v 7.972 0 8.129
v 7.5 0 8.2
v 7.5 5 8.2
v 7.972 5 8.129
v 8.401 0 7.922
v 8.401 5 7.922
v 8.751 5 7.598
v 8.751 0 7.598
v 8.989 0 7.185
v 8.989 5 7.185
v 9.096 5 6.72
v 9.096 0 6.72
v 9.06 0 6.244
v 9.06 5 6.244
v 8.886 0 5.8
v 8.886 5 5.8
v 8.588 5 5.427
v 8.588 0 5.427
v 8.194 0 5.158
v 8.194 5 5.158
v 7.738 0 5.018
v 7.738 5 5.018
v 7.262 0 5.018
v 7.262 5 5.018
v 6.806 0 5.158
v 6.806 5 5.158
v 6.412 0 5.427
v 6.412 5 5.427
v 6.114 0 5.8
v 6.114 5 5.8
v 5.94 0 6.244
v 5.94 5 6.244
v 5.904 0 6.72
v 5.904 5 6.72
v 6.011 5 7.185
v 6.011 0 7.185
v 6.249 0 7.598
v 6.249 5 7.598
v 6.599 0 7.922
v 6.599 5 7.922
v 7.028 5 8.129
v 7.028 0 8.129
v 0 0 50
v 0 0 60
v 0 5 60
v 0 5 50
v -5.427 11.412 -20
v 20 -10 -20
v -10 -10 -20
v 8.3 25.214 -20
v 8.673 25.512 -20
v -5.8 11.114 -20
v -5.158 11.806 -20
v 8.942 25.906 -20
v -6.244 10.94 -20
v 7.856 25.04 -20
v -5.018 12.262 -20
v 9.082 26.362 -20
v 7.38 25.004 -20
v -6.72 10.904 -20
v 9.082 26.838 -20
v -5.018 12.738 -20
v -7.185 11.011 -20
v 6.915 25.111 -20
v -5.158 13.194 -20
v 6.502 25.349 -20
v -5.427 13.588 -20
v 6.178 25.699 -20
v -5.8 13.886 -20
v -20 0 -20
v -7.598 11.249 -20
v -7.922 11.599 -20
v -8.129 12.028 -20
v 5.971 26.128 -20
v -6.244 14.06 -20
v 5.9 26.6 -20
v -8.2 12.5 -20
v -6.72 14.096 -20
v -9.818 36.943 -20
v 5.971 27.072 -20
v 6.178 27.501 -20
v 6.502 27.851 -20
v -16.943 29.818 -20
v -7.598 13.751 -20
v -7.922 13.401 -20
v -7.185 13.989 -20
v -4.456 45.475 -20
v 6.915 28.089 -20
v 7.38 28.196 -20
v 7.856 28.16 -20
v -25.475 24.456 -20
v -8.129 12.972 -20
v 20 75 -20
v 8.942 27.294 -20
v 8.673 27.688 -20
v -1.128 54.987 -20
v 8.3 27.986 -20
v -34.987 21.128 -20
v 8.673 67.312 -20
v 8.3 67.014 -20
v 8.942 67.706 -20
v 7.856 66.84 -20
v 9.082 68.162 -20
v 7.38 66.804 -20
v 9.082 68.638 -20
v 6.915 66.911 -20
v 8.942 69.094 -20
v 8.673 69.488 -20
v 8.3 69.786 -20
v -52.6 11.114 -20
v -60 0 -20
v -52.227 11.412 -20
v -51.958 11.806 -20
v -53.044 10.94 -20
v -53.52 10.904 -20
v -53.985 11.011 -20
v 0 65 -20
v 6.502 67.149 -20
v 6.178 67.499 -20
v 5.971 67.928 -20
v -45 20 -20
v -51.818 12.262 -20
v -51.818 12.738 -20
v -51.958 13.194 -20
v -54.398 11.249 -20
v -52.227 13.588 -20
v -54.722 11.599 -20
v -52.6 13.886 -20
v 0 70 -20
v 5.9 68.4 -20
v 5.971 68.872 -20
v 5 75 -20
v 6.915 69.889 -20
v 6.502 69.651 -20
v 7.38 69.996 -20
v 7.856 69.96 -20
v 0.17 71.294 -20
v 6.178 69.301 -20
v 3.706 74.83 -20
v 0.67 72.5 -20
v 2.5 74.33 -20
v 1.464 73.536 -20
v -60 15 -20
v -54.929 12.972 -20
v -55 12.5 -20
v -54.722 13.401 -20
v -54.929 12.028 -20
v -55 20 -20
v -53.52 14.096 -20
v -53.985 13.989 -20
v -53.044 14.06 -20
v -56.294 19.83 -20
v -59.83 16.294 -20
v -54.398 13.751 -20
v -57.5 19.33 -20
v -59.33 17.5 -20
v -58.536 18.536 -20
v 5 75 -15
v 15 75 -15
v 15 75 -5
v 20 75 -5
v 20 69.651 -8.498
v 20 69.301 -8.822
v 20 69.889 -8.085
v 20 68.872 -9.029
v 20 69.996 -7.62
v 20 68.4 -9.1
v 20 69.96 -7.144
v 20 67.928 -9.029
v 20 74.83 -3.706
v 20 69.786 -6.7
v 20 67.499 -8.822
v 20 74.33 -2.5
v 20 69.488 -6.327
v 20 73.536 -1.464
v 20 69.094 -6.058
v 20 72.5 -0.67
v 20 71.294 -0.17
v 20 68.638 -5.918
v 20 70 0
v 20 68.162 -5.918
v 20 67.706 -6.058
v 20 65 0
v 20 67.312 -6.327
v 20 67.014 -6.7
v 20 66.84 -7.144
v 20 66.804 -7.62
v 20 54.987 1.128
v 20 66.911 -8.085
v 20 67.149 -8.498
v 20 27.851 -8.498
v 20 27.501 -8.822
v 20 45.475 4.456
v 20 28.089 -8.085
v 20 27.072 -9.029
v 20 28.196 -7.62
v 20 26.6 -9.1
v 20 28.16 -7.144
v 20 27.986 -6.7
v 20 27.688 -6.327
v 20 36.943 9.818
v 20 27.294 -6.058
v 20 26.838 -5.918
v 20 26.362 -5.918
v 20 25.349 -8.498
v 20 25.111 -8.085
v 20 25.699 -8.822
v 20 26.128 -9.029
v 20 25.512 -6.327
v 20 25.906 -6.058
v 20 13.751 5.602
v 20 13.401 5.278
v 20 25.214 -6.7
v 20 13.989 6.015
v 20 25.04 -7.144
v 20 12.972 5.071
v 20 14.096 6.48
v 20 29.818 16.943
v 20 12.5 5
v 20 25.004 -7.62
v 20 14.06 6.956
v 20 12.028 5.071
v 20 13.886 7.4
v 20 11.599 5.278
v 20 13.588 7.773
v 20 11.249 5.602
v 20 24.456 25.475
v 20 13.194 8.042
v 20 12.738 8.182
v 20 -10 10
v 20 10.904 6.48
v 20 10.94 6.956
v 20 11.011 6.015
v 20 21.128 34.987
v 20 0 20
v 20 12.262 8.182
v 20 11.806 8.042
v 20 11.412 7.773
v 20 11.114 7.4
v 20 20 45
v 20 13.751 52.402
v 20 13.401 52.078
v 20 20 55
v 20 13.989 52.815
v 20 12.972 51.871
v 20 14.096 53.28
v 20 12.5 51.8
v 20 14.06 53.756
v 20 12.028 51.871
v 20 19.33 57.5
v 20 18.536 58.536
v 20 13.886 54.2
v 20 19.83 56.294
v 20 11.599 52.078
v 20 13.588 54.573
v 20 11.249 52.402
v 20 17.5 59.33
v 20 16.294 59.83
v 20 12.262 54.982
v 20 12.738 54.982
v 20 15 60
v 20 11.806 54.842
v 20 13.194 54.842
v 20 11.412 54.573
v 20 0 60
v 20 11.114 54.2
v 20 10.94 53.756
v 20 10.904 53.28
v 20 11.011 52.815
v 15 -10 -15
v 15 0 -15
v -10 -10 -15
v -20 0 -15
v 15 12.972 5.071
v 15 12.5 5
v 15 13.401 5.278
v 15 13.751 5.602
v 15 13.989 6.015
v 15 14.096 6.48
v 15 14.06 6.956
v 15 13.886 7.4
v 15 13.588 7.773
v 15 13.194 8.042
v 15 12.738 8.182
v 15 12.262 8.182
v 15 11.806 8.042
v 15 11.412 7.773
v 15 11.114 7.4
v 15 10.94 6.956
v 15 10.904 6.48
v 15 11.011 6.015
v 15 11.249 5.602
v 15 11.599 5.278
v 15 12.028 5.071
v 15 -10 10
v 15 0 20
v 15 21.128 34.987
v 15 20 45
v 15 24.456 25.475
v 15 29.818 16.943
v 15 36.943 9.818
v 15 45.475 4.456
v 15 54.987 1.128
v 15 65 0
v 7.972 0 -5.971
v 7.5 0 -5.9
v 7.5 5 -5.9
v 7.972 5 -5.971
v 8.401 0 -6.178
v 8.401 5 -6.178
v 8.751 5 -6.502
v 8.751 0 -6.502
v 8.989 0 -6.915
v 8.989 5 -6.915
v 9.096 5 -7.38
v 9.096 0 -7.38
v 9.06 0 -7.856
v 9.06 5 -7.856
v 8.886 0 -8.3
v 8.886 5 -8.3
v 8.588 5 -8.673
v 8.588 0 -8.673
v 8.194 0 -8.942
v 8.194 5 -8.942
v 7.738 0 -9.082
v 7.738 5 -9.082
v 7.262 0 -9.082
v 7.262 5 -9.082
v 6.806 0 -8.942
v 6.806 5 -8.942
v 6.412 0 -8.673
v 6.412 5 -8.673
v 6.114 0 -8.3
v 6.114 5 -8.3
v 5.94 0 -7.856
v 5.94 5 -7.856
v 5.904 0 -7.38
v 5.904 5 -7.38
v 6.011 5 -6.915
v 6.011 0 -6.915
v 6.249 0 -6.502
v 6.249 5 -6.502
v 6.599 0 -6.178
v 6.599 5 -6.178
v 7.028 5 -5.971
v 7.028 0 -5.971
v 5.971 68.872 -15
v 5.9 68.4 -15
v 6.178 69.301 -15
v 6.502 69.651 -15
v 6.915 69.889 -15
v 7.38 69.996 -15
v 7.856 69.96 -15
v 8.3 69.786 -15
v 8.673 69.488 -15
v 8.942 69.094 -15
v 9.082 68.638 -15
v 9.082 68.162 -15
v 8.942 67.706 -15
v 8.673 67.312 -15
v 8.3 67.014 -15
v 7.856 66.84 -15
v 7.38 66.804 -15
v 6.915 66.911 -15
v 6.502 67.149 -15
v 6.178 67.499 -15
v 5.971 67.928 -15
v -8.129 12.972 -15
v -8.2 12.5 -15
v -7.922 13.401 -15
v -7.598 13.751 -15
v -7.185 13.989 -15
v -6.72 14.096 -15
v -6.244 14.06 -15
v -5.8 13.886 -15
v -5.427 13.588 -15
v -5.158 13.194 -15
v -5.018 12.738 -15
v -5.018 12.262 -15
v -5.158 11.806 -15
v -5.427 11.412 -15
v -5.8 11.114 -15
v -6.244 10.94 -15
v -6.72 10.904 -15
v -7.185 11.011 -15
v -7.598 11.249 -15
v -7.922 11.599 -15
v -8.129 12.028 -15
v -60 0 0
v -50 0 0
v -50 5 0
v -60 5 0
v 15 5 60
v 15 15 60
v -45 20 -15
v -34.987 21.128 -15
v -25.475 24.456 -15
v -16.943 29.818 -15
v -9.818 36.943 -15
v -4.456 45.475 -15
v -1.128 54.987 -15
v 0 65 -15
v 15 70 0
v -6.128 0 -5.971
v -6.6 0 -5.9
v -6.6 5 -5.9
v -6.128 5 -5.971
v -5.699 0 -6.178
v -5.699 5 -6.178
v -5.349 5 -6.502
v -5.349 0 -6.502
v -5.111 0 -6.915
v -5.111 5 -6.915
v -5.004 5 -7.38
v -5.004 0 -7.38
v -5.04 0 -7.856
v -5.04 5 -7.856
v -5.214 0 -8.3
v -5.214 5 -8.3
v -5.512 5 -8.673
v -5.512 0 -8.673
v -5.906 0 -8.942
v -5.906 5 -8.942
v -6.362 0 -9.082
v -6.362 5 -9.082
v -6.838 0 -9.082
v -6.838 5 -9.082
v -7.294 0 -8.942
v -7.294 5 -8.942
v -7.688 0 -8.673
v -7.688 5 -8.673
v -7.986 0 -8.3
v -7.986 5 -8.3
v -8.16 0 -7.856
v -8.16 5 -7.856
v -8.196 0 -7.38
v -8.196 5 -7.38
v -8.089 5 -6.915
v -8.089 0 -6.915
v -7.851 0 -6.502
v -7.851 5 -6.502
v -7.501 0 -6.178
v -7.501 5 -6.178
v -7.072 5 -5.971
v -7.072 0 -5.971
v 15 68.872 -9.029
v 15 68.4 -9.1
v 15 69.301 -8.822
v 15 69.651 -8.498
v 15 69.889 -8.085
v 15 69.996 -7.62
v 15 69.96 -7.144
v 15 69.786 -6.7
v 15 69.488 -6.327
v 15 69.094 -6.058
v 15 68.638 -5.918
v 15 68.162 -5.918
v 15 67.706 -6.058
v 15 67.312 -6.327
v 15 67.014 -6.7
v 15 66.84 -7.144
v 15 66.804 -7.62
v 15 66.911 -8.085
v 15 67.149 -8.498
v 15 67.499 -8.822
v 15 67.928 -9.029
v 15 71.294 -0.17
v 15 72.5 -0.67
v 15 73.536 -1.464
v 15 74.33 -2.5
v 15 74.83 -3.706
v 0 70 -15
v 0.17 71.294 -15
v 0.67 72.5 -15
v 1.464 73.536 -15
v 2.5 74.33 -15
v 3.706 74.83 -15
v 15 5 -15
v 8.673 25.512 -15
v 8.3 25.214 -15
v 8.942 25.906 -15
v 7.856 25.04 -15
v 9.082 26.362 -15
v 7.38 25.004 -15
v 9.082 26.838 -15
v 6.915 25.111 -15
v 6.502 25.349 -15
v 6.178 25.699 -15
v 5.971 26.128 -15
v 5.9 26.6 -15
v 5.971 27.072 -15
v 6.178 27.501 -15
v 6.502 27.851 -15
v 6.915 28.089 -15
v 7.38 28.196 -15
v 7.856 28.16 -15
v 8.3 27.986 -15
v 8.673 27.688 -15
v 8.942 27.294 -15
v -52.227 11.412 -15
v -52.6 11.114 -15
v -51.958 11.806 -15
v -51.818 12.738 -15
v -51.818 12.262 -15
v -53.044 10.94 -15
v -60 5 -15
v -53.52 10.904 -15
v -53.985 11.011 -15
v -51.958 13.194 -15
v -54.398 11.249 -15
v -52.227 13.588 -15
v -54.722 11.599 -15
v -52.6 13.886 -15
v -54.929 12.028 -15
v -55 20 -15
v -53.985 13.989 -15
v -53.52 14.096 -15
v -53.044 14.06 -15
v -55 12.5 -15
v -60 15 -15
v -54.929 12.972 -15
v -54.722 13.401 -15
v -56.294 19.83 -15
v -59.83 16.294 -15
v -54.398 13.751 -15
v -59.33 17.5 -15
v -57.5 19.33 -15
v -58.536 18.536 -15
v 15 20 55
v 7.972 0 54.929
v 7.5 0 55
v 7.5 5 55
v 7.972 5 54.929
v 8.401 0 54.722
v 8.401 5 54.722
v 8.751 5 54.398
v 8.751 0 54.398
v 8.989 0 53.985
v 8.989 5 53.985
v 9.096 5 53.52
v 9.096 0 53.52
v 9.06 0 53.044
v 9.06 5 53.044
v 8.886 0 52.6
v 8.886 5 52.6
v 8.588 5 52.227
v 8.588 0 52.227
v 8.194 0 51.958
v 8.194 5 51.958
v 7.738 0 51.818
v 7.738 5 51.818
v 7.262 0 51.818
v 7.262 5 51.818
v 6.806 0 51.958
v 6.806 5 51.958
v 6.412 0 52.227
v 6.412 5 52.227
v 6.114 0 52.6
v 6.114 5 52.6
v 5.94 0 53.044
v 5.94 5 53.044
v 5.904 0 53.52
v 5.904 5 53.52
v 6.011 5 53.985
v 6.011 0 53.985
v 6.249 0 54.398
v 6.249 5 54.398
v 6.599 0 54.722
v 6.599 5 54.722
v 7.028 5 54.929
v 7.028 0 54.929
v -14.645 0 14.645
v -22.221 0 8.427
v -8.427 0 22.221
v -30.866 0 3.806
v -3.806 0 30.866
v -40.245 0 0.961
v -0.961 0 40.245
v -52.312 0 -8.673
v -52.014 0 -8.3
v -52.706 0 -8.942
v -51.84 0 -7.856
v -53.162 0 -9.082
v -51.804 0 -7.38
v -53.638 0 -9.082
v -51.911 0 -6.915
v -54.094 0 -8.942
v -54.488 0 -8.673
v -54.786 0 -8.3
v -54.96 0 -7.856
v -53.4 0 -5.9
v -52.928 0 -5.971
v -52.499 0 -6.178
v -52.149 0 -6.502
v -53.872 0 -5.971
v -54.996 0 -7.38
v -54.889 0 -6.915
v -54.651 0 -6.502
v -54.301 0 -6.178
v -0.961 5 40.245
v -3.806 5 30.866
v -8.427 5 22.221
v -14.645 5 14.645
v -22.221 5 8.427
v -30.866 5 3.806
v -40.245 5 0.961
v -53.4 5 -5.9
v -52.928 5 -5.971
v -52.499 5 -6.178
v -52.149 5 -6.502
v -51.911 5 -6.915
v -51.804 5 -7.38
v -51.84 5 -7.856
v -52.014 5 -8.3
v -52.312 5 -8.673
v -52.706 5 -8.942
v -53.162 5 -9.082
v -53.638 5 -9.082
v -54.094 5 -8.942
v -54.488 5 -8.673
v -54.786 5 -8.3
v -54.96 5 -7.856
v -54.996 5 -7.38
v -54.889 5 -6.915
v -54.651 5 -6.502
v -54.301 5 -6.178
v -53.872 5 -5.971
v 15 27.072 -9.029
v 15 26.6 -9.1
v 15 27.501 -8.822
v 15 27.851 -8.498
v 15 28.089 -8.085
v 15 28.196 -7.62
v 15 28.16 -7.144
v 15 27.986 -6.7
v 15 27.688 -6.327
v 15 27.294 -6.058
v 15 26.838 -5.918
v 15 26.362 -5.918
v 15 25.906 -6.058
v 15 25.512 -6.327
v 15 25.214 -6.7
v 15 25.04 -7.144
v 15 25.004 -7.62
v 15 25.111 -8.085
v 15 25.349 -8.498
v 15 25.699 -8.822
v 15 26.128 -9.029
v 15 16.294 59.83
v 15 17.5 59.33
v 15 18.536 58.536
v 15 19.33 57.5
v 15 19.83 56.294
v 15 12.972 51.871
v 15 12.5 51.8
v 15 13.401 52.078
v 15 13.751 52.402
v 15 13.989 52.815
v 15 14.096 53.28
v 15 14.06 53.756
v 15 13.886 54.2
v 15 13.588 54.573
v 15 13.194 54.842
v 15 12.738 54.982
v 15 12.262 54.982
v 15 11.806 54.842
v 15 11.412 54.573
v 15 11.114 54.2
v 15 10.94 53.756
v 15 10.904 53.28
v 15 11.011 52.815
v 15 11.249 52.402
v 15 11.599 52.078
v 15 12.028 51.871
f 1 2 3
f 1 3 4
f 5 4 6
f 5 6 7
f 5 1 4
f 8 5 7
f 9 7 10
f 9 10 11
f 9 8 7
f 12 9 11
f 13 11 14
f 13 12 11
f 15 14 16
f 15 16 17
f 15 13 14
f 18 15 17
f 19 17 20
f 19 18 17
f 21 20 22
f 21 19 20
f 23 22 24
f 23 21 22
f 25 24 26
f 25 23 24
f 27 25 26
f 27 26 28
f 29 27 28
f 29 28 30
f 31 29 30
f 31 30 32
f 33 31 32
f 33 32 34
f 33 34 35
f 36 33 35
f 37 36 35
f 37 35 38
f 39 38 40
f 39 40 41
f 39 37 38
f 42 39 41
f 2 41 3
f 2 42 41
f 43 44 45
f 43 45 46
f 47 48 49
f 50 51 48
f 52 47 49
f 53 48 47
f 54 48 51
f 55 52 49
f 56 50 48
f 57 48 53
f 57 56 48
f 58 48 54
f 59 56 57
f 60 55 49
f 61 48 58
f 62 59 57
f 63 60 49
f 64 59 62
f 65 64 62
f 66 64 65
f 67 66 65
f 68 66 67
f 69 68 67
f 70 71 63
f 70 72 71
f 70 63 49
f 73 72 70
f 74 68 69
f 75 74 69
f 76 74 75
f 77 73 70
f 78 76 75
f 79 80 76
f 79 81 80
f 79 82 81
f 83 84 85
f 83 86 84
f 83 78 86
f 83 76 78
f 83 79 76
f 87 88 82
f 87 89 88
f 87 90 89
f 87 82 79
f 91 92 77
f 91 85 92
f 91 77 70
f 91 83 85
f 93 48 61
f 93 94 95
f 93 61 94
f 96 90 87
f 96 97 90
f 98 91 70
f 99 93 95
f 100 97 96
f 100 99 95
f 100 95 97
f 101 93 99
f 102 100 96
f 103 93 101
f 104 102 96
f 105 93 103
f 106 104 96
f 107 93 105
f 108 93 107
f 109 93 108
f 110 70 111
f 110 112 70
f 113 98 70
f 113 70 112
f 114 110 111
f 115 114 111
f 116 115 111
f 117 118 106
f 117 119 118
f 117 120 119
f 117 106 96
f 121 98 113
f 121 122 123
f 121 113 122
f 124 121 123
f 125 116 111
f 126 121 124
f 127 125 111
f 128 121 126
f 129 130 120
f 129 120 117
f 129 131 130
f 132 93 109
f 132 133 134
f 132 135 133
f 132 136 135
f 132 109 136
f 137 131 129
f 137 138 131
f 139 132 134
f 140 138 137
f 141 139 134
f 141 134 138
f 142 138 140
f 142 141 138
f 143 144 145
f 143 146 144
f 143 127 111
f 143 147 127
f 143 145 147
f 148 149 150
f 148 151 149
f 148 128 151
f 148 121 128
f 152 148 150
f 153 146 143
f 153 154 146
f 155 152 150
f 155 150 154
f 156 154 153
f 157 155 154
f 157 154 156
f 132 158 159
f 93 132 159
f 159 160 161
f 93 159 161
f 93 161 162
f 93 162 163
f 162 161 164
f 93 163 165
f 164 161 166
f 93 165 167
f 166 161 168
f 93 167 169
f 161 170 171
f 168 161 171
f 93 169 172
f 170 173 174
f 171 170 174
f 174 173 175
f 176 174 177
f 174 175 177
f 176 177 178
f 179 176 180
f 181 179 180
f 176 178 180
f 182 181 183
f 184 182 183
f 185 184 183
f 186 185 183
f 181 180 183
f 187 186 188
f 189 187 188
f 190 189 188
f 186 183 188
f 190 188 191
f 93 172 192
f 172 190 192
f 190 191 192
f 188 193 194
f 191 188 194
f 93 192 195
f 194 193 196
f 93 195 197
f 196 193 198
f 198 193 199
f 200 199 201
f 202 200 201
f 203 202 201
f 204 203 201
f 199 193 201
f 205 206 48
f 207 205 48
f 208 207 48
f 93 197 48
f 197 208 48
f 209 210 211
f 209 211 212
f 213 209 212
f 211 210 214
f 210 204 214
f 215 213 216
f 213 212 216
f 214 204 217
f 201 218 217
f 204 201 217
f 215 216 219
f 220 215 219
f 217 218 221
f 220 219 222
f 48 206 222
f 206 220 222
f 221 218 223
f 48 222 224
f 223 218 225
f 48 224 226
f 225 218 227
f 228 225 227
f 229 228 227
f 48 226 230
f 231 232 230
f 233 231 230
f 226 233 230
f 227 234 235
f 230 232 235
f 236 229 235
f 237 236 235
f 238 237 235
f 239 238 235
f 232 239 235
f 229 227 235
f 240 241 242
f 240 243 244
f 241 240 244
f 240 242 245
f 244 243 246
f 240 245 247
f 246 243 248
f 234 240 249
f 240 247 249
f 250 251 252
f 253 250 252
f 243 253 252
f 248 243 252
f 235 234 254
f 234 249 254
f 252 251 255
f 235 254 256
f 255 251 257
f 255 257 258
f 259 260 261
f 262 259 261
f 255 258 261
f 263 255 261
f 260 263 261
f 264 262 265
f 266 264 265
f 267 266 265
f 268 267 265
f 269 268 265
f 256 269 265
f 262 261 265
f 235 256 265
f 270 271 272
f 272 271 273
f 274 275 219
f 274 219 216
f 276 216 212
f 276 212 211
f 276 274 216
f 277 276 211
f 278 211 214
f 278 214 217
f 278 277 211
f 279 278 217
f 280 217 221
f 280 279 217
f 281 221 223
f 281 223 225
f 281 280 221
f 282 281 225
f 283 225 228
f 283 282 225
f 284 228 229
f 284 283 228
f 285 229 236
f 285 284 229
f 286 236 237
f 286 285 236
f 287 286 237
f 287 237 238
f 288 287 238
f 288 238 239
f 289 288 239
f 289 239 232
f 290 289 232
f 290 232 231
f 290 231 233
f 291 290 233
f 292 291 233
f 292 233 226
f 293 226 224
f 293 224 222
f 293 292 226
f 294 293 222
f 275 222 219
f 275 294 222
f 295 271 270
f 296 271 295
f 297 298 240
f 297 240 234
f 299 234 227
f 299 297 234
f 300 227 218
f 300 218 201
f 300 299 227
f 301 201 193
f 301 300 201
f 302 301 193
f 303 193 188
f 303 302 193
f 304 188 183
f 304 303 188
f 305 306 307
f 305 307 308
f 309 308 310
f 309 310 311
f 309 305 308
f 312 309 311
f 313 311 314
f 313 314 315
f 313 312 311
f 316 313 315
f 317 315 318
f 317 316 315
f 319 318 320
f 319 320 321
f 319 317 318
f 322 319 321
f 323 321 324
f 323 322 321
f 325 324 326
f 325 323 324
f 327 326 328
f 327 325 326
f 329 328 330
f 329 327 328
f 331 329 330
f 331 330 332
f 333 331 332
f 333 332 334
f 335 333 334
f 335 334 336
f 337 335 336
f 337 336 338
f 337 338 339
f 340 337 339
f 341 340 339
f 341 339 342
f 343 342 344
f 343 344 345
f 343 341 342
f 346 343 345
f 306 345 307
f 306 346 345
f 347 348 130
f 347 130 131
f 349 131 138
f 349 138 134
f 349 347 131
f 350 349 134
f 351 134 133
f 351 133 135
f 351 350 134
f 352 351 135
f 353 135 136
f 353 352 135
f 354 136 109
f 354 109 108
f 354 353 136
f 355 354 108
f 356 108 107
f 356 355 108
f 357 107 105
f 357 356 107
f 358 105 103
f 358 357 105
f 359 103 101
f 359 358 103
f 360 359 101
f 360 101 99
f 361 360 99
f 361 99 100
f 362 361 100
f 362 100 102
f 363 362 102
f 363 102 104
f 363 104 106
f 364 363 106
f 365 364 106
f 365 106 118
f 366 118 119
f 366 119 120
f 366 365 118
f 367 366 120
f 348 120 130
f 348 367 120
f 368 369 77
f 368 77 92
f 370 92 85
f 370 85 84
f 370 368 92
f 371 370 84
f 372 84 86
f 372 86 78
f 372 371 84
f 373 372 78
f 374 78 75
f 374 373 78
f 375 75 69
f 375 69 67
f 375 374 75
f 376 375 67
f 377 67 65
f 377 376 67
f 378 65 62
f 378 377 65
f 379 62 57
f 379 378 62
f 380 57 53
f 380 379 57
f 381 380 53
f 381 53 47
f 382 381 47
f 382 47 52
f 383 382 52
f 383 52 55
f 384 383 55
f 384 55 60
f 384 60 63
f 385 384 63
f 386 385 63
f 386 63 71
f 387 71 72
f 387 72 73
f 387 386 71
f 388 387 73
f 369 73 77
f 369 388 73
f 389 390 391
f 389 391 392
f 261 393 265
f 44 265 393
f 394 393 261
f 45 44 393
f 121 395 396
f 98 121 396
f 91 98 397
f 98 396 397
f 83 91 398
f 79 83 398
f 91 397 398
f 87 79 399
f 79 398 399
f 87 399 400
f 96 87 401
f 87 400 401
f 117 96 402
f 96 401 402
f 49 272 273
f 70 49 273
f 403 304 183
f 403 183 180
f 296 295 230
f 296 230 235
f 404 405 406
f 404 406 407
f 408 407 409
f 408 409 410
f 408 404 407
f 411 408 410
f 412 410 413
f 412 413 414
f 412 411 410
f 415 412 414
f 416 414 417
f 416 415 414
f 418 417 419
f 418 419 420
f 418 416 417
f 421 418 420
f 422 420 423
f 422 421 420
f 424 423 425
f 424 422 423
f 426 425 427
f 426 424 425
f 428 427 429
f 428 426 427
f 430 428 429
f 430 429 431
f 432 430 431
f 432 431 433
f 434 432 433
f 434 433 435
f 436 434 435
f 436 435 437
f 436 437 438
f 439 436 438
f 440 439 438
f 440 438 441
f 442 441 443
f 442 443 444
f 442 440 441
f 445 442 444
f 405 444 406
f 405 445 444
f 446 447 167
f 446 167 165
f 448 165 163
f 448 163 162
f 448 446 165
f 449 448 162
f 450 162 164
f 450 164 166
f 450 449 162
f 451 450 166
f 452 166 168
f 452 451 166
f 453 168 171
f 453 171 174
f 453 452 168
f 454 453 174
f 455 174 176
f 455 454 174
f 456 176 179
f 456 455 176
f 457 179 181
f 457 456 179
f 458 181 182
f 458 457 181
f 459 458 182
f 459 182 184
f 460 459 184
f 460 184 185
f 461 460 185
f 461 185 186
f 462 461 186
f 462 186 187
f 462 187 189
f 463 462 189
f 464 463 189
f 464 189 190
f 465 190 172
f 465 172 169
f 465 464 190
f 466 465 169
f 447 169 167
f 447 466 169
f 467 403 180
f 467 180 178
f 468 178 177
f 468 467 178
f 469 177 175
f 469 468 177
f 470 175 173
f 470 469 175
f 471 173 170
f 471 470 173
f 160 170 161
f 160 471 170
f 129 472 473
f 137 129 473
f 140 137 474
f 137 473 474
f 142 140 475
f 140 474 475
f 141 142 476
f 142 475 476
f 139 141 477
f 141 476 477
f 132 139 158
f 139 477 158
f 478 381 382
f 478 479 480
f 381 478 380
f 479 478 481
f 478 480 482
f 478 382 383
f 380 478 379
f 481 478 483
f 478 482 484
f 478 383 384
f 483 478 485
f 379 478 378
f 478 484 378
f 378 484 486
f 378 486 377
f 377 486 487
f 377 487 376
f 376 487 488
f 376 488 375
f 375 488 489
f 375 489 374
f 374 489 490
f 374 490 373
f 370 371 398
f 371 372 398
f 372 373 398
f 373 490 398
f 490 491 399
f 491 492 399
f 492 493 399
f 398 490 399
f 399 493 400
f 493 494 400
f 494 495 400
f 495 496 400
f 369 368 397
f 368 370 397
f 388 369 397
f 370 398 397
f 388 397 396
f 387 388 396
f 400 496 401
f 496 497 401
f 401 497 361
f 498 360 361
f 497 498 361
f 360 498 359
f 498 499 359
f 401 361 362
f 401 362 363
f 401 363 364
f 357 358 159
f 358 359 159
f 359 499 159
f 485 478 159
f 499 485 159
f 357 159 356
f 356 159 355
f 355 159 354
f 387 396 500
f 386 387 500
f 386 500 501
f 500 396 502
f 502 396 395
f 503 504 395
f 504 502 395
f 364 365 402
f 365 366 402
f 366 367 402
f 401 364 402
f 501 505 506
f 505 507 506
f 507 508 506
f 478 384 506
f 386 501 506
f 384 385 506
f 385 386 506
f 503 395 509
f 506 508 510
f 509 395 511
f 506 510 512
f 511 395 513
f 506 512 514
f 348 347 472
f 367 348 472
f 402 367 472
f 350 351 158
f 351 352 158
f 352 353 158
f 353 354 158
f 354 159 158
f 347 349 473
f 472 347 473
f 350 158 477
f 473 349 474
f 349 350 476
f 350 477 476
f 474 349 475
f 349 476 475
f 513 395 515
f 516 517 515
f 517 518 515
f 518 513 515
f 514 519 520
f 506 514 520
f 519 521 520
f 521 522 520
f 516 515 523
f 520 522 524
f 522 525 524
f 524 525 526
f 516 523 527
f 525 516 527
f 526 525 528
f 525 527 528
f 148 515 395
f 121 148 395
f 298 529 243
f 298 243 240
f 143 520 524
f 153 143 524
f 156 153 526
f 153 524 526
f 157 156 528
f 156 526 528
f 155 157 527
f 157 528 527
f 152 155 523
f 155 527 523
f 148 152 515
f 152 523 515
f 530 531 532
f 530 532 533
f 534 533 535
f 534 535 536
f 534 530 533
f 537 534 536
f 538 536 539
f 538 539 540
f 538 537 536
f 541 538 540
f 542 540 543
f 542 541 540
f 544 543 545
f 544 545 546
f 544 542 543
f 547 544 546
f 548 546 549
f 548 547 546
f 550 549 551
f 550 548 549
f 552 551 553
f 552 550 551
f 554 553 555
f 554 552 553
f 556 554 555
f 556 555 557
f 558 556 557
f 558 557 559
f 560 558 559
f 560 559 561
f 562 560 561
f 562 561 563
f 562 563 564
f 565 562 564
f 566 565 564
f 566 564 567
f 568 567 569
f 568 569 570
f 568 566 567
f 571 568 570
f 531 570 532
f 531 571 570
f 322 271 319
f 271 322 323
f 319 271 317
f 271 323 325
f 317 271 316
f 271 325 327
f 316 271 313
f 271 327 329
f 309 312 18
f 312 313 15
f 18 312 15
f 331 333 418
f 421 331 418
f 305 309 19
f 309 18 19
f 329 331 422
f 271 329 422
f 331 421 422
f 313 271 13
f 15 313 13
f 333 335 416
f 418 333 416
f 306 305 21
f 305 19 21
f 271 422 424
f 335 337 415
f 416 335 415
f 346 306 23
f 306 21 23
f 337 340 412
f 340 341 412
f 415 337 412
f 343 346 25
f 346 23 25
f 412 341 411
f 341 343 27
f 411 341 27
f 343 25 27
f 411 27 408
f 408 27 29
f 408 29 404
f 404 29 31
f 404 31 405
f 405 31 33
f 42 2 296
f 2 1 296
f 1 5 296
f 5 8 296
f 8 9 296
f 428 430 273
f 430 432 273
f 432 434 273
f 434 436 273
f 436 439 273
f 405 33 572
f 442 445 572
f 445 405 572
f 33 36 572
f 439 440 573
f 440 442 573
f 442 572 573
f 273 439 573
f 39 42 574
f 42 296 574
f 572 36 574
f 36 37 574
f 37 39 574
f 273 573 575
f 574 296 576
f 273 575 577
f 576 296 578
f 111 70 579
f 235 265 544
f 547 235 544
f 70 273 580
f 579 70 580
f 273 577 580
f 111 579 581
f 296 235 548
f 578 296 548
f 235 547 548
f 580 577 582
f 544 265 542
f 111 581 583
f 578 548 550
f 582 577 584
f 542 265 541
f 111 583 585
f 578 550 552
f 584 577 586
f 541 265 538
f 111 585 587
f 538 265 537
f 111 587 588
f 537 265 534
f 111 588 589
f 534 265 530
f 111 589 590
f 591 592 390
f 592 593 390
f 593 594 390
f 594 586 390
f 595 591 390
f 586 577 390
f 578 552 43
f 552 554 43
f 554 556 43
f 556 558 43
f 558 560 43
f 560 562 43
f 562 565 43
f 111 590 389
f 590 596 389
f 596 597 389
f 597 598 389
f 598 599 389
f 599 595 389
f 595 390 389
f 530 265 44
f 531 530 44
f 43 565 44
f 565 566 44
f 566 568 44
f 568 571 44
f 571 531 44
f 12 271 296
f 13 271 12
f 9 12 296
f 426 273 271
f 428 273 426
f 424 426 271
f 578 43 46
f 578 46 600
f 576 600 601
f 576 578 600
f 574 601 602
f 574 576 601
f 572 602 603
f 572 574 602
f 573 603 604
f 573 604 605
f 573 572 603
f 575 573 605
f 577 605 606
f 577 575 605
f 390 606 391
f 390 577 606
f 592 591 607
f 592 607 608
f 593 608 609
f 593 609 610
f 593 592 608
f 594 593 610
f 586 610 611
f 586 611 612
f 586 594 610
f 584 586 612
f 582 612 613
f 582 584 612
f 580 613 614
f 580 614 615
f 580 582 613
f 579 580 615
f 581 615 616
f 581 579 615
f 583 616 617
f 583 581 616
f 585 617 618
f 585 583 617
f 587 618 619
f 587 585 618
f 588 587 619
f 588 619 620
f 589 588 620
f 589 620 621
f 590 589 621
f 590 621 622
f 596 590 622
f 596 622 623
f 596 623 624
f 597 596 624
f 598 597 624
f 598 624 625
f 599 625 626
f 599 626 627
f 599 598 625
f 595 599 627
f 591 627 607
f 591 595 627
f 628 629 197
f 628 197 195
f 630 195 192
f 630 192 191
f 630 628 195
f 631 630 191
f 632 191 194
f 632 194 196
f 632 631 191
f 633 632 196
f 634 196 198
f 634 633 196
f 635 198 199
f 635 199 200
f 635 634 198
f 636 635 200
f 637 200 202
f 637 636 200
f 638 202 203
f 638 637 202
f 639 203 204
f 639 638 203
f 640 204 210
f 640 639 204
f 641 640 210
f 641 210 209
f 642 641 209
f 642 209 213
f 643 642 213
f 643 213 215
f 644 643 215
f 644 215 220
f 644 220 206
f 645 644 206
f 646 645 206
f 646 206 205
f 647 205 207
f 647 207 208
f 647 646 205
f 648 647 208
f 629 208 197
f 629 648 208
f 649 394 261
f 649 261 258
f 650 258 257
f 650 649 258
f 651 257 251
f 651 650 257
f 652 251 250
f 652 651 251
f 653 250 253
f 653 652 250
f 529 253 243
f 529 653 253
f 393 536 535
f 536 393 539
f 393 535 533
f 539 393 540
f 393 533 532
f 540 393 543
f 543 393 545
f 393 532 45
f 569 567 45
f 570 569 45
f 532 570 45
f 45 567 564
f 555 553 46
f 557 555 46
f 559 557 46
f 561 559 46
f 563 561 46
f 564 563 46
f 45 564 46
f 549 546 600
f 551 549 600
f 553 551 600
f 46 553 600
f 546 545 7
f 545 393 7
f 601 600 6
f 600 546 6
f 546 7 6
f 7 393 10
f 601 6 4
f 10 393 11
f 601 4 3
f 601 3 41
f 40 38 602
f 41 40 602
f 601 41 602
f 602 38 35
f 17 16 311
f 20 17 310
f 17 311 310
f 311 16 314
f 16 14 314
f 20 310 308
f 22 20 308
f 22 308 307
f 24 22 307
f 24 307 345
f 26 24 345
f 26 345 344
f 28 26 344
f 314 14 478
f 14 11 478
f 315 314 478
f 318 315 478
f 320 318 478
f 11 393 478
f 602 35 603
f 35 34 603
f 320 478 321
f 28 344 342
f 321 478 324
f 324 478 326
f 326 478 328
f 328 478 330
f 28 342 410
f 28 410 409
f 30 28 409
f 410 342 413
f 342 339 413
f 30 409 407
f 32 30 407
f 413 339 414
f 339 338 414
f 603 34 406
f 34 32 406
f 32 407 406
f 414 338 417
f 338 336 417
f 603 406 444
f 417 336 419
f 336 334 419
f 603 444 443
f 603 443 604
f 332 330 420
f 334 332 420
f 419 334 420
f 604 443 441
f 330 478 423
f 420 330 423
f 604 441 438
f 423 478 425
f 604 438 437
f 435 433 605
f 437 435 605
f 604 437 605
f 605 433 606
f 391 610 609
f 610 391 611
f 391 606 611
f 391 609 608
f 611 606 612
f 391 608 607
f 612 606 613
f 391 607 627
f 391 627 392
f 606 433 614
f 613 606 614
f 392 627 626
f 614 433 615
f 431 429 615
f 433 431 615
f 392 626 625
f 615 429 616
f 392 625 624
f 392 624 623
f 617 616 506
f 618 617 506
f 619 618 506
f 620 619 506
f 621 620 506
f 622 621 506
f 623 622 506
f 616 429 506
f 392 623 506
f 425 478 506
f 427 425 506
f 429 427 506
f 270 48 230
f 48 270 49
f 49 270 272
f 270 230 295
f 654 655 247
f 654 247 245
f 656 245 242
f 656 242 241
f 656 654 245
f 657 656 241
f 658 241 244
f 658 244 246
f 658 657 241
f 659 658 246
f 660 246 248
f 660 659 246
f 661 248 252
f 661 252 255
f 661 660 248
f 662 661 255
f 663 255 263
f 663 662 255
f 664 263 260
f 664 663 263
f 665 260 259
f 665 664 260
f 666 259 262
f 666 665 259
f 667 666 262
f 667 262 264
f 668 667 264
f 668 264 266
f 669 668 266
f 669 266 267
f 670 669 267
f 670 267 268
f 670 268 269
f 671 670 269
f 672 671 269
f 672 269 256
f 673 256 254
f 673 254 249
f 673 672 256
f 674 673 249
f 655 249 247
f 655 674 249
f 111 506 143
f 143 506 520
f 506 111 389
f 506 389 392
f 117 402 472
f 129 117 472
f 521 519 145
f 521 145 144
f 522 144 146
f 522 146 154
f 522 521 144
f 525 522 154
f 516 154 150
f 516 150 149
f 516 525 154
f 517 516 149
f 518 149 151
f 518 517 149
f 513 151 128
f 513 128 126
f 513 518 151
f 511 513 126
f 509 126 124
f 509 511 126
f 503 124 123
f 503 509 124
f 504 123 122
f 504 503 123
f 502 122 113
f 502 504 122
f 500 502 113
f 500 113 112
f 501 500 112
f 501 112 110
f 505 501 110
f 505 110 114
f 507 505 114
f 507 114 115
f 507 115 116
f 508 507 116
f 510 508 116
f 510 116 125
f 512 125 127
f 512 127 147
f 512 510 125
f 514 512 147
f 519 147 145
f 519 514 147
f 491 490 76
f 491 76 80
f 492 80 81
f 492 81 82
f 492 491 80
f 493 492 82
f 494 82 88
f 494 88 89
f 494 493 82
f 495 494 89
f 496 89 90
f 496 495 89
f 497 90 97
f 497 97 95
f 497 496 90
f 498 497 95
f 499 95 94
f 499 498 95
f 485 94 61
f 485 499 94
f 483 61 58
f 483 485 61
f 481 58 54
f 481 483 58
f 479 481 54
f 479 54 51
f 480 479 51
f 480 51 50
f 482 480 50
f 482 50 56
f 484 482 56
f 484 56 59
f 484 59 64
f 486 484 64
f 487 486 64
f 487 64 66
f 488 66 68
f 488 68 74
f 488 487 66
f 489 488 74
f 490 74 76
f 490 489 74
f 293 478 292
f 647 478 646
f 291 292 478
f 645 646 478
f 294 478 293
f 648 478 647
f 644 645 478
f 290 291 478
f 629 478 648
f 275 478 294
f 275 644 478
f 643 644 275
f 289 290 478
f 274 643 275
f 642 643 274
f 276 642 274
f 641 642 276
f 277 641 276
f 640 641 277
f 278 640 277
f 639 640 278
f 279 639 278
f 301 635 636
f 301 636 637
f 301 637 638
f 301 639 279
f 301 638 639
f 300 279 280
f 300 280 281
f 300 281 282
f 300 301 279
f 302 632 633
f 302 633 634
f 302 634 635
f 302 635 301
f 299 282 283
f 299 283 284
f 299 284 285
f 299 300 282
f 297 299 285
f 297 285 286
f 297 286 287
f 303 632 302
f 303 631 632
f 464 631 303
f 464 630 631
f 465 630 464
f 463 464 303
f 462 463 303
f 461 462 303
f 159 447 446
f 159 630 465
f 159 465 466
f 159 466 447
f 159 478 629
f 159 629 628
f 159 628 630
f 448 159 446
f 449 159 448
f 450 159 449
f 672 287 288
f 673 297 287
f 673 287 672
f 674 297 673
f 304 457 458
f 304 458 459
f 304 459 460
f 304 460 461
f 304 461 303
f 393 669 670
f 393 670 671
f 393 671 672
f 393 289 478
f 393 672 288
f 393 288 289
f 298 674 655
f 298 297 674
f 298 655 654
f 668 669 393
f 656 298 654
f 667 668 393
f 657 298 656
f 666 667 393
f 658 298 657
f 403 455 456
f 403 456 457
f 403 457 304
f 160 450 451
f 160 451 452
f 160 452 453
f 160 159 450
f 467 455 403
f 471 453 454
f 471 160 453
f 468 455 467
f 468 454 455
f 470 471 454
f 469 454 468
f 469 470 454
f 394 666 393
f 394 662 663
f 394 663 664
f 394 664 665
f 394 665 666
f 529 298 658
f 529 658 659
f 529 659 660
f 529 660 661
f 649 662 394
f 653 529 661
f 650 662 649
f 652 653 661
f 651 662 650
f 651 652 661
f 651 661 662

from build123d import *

# Parameters (mm, degrees)
SKETCH1_R           = 1.6
BOSS_EXTRUDE1_DEPTH = 5
SKETCH2_R           = 1.6
BOSS_EXTRUDE2_DEPTH = 5
SKETCH3_R           = 1.6
BOSS_EXTRUDE3_DEPTH = 5


with BuildPart() as part:
    # Sketch1 → Boss-Extrude1 (new body)
    with BuildSketch(Plane(origin=(0, 0, 0), x_dir=(1, 0, 0), z_dir=(0, 1, 0))):
        with BuildLine():
            Line((-50, 0), (-60, 0))
            Line((-60, 0), (-60, 15))
            Line((-60, 15), (15, 15))
            Line((15, 15), (15, -60))
            Line((15, -60), (0, -60))
            Line((0, -60), (0, -50))
            ThreePointArc((0, -50), (-14.644660941, -14.644660941), (-50, 0))
        make_face()
        with Locations(Location((7.5, 7.5, 0), (0, 0, 270))):
            Circle(SKETCH1_R, mode=Mode.SUBTRACT)
        with Locations(Location((7.5, -6.6, 0), (0, 0, 270))):
            Circle(SKETCH1_R, mode=Mode.SUBTRACT)
        with Locations(Location((7.5, -53.4, 0), (0, 0, 270))):
            Circle(SKETCH1_R, mode=Mode.SUBTRACT)
        with Locations(Location((-53.4, 7.5, 0), (0, 0, 270))):
            Circle(SKETCH1_R, mode=Mode.SUBTRACT)
        with Locations(Location((-6.6, 7.5, 0), (0, 0, 270))):
            Circle(SKETCH1_R, mode=Mode.SUBTRACT)
    extrude(amount=BOSS_EXTRUDE1_DEPTH)

    # Sketch2 → Boss-Extrude2 (add)
    with BuildSketch(Plane(origin=(15, 0, 0), x_dir=(0, 0, -1), z_dir=(1, 0, 0))):
        with BuildLine():
            Line((-10, -10), (-20, 0))
            Line((-20, 0), (-60, 0))
            Line((-60, 0), (-60, 15))
            ThreePointArc((-60, 15), (-58.535533906, 18.535533906), (-55, 20))
            Line((-55, 20), (-45, 20))
            ThreePointArc((-45, 20), (-13.180194847, 33.180194847), (0, 65))
            Line((0, 65), (0, 70))
            ThreePointArc((0, 70), (1.464466094, 73.535533906), (5, 75))
            Line((5, 75), (15, 75))
            Line((15, 75), (15, -10))
            Line((15, -10), (-10, -10))
        make_face()
        with Locations((-53.4, 12.5)):
            Circle(SKETCH2_R, mode=Mode.SUBTRACT)
        with Locations((-6.6, 12.5)):
            Circle(SKETCH2_R, mode=Mode.SUBTRACT)
        with Locations((7.5, 26.6)):
            Circle(SKETCH2_R, mode=Mode.SUBTRACT)
        with Locations((7.5, 68.4)):
            Circle(SKETCH2_R, mode=Mode.SUBTRACT)
    extrude(amount=BOSS_EXTRUDE2_DEPTH)

    # Sketch3 → Boss-Extrude3 (add)
    with BuildSketch(Plane(origin=(0, 0, -15), x_dir=(-1, 0, 0), z_dir=(0, 0, -1))):
        with BuildLine():
            Line((-20, -10), (10, -10))
            Line((10, -10), (20, 0))
            Line((20, 0), (60, 0))
            Line((60, 0), (60, 15))
            ThreePointArc((60, 15), (58.535533906, 18.535533906), (55, 20))
            Line((55, 20), (45, 20))
            ThreePointArc((45, 20), (13.180194847, 33.180194847), (0, 65))
            Line((0, 65), (0, 70))
            ThreePointArc((0, 70), (-1.464466094, 73.535533906), (-5, 75))
            Line((-5, 75), (-20, 75))
            Line((-20, 75), (-20, -10))
        make_face()
        with Locations((-7.5, 68.4)):
            Circle(SKETCH3_R, mode=Mode.SUBTRACT)
        with Locations((-7.5, 26.6)):
            Circle(SKETCH3_R, mode=Mode.SUBTRACT)
        with Locations((6.6, 12.5)):
            Circle(SKETCH3_R, mode=Mode.SUBTRACT)
        with Locations((53.4, 12.5)):
            Circle(SKETCH3_R, mode=Mode.SUBTRACT)
    extrude(amount=BOSS_EXTRUDE3_DEPTH)


solid = part.part
